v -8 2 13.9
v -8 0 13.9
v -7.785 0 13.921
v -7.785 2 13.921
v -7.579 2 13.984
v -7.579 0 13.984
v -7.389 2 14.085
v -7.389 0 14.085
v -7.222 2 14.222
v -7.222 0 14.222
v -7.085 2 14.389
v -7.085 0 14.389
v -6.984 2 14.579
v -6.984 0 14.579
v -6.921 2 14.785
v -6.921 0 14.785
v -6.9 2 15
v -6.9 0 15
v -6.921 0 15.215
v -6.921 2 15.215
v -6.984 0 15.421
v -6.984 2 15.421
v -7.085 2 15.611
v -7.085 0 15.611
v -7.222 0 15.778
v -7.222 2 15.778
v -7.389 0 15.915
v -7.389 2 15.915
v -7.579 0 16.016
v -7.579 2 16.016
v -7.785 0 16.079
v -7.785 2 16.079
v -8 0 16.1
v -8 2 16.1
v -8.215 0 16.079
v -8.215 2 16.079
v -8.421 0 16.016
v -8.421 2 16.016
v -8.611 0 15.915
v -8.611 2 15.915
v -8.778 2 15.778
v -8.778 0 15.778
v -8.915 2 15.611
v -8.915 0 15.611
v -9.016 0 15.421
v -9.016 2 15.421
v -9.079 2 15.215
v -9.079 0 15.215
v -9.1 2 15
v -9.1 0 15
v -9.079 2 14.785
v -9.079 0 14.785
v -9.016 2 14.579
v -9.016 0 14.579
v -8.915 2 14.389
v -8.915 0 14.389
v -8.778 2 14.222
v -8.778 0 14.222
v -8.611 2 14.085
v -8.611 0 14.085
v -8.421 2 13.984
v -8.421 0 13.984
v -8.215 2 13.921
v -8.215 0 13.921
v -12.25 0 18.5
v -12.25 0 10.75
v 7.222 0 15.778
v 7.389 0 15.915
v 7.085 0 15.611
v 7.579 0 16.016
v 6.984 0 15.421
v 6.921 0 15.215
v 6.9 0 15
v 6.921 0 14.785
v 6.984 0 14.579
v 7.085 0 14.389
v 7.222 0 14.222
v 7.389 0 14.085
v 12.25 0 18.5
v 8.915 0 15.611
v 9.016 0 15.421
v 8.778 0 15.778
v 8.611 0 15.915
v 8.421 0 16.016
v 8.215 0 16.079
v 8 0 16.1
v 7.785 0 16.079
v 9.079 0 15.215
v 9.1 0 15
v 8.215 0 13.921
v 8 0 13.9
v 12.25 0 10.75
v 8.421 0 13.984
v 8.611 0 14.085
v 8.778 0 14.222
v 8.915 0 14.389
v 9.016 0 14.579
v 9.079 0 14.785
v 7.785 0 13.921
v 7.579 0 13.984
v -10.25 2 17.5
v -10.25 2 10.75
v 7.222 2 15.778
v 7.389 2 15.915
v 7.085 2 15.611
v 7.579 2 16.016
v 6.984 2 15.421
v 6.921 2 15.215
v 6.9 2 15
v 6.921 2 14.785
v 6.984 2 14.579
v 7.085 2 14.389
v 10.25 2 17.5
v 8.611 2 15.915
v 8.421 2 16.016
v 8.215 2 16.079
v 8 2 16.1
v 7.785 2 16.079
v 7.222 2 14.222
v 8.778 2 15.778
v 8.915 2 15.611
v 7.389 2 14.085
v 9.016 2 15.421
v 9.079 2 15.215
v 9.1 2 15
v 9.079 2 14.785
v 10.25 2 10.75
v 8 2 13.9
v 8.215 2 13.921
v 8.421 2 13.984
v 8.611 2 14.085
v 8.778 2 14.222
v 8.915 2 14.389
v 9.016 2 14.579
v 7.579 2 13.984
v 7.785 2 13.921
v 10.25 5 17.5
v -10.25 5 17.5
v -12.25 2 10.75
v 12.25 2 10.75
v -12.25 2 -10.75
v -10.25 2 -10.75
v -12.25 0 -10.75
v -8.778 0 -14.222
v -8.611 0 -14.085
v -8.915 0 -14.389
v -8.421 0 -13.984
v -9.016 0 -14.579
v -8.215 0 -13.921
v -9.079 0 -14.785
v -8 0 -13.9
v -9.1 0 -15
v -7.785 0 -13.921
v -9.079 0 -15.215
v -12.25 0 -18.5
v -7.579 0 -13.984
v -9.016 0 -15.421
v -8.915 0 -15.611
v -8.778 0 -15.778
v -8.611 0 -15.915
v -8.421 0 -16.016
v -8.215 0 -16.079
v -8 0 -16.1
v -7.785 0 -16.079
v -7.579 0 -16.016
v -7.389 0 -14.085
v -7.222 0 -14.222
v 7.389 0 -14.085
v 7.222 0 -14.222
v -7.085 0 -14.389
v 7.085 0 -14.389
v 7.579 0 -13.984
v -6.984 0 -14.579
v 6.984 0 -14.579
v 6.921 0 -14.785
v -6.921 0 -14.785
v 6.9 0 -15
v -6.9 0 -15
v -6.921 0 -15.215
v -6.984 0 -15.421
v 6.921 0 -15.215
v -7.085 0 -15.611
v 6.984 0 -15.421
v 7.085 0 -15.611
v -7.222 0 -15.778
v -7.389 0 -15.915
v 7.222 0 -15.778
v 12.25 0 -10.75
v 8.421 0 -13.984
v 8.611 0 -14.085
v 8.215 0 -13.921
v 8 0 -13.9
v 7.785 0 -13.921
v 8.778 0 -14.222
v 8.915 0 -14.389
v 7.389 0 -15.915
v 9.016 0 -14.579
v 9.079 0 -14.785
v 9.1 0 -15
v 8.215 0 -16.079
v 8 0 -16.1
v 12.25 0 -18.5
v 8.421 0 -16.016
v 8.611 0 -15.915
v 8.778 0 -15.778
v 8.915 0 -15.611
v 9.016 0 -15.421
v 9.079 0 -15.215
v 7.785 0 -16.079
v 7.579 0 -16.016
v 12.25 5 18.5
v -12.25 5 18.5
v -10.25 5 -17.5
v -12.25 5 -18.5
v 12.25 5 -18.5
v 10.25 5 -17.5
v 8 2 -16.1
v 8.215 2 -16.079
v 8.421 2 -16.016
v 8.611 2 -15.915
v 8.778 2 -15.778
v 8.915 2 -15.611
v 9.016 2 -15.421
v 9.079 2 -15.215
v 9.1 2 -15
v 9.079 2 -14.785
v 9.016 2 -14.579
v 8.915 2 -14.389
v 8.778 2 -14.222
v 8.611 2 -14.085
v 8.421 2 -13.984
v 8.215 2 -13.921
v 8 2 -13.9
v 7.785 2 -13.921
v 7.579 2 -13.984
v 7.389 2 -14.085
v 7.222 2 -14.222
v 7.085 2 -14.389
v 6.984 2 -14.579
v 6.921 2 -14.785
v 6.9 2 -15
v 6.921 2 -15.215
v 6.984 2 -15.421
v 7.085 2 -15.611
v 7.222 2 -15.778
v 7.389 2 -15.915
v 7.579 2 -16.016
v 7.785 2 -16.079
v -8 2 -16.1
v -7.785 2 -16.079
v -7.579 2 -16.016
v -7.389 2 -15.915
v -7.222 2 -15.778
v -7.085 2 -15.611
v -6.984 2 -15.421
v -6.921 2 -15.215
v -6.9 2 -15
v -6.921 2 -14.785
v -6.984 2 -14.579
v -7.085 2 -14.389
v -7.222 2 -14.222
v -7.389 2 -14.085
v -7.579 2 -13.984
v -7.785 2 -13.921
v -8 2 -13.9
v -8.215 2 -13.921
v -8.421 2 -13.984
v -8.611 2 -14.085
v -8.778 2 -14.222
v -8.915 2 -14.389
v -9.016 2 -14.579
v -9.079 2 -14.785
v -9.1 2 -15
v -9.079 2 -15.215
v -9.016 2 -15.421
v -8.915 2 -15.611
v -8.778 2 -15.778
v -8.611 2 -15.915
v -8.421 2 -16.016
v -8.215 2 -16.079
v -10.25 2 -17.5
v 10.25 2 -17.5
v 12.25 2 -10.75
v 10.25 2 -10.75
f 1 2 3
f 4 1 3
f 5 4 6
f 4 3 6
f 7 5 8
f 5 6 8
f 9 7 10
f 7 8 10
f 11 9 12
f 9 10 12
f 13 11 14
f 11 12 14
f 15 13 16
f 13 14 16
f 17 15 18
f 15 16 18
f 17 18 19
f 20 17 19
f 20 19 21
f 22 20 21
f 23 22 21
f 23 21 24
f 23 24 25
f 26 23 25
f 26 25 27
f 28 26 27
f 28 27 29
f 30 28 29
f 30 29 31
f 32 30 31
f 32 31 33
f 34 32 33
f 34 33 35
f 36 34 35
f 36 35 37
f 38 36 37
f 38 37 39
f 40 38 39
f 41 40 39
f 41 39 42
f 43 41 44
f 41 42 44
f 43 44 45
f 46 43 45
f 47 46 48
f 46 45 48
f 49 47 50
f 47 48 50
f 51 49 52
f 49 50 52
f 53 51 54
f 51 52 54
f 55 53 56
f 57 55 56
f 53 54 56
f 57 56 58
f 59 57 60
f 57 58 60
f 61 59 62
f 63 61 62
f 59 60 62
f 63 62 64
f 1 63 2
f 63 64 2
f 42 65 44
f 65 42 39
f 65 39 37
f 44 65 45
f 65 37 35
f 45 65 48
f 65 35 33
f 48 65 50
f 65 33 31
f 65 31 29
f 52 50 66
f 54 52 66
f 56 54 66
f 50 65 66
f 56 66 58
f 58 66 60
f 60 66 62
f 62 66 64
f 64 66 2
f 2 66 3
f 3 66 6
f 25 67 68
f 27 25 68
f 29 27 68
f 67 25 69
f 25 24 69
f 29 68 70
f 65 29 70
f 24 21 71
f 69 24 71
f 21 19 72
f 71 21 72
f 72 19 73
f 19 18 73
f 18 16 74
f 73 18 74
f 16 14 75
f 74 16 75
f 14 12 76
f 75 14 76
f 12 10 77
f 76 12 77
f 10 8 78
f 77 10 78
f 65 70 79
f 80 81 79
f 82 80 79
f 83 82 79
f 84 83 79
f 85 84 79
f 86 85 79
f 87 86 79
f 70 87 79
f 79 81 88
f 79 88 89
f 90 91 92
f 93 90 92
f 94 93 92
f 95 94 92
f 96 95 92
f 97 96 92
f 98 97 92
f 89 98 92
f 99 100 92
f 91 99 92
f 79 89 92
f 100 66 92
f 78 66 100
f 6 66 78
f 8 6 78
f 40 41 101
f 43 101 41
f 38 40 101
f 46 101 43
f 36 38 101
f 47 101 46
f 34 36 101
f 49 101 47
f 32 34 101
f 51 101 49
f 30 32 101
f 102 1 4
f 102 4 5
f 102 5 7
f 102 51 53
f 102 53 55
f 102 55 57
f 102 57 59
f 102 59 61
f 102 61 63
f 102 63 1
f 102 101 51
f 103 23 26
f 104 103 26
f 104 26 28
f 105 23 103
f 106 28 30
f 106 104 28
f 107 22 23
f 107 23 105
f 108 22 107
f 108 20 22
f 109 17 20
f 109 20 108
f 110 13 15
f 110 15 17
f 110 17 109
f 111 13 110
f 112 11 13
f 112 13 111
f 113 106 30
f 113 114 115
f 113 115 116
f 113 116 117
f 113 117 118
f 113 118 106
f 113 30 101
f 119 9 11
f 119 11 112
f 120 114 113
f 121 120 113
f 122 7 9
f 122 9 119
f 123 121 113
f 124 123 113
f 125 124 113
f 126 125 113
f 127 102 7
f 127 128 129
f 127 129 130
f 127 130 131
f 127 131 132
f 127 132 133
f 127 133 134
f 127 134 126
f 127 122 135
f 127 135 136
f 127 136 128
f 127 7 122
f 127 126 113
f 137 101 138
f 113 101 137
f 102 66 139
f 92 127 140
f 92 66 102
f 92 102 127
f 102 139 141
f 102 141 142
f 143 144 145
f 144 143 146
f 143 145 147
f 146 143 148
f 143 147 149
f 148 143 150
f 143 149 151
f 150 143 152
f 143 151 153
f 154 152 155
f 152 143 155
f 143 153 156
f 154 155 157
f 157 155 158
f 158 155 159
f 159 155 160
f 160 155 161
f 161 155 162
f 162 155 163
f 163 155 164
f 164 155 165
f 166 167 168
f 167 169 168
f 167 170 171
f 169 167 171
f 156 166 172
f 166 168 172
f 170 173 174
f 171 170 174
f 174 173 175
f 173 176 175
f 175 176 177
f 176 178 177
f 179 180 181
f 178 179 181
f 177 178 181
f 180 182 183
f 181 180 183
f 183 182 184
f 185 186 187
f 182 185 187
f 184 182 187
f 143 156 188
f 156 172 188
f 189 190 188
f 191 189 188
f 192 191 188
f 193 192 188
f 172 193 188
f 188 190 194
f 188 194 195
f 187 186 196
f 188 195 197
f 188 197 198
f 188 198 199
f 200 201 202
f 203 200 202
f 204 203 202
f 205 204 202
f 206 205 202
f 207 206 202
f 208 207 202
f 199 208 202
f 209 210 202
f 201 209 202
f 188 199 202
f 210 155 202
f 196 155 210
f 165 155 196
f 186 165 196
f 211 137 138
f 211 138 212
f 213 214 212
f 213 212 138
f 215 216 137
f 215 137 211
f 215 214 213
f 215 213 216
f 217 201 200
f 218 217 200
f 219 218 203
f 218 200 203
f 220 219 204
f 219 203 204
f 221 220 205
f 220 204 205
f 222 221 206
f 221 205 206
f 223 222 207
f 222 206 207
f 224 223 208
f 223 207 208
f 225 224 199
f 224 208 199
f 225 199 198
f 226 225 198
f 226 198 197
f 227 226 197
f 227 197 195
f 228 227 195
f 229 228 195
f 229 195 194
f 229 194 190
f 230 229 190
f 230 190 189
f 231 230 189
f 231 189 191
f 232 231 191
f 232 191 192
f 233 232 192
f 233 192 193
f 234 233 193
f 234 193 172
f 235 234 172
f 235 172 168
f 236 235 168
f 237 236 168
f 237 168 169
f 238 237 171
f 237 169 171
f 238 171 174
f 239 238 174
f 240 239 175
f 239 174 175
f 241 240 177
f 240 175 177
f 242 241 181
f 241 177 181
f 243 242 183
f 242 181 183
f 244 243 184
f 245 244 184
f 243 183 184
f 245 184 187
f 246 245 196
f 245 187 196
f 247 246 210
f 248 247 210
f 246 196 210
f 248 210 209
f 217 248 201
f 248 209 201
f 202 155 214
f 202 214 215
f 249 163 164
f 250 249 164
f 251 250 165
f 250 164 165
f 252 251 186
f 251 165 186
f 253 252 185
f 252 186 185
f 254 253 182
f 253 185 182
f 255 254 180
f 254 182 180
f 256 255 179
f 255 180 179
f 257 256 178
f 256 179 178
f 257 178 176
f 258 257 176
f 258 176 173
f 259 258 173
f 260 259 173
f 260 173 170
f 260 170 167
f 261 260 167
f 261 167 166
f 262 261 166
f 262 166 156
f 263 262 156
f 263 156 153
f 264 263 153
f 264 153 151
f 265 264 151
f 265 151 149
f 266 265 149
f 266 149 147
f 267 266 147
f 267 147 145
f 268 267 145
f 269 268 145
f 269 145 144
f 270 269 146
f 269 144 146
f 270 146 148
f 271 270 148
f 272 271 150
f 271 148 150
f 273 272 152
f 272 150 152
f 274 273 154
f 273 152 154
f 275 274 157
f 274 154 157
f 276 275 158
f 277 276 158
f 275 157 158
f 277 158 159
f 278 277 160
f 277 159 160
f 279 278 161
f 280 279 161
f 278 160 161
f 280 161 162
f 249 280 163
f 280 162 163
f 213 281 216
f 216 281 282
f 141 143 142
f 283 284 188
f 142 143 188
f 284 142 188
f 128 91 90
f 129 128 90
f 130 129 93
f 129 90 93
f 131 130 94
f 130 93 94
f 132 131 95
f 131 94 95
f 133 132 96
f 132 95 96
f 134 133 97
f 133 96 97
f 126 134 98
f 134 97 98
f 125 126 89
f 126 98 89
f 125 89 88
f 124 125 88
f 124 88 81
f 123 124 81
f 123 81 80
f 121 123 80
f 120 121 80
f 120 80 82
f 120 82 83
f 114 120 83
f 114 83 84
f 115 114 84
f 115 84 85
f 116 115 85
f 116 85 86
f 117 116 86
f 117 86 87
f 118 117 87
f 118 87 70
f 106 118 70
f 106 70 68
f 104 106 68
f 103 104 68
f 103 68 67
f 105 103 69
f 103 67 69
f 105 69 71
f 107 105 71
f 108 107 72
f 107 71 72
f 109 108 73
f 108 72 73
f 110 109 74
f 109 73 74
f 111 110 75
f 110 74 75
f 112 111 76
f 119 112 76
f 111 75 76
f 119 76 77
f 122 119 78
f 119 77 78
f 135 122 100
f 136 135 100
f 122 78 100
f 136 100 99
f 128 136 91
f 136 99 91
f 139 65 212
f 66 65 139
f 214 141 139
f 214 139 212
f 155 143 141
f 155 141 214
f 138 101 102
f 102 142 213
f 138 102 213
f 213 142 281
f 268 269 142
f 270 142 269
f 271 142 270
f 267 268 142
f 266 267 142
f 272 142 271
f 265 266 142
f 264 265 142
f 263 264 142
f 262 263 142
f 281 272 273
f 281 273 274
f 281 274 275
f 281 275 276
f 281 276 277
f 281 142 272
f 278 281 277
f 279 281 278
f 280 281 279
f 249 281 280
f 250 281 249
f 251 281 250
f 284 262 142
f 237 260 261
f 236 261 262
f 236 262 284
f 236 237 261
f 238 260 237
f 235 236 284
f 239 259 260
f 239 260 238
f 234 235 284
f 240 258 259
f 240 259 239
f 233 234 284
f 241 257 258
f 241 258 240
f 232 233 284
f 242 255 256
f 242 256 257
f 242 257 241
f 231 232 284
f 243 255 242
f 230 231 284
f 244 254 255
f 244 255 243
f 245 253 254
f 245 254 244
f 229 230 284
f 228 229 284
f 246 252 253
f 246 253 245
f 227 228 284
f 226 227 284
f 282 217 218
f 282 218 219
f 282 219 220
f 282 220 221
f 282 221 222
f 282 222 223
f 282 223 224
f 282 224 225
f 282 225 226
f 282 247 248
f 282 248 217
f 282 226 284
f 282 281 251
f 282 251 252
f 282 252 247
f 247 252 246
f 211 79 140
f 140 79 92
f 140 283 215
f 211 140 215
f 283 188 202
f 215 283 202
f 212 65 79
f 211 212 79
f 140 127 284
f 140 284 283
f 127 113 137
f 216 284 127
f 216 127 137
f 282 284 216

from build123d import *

# Parameters (mm, degrees)
SKETCH_1_W          = 20.5
SKETCH_1_H          = 35
EXTRUDE_1_DEPTH     = 2
SKETCH_2_W          = 24.5
SKETCH_2_H          = 37
SKETCH_2_W_2        = 20.5
SKETCH_2_H_2        = 35
EXTRUDE_2_DEPTH     = 5
SKETCH_3_R          = 1.1
CUT_EXTRUDE_1_DEPTH = 23.744504831
SKETCH_4_W          = 24.5
SKETCH_4_H          = 21.5
CUT_EXTRUDE_4_DEPTH = 2


with BuildPart() as part:
    # 草图1 → 凸台-拉伸1 (new body)
    with BuildSketch(Plane(origin=(0, 0, 0), x_dir=(1, 0, 0), z_dir=(0, 1, 0))):
        Rectangle(SKETCH_1_W, SKETCH_1_H)
    extrude(amount=EXTRUDE_1_DEPTH)

    # 草图2 → 凸台-拉伸2 (add)
    with BuildSketch(Plane(origin=(0, 0, 0), x_dir=(1, 0, 0), z_dir=(0, 1, 0))):
        Rectangle(SKETCH_2_W, SKETCH_2_H)
        Rectangle(SKETCH_2_W_2, SKETCH_2_H_2, mode=Mode.SUBTRACT)
    extrude(amount=EXTRUDE_2_DEPTH)

    # 草图3 → 切除-拉伸1 (cut, through all)
    with BuildSketch(Plane.XZ):
        with Locations(Location((-8, 15, 0), (0, 0, 270))):
            Circle(SKETCH_3_R)
        with Locations(Location((8, 15, 0), (0, 0, 270))):
            Circle(SKETCH_3_R)
        with Locations(Location((8, -15, 0), (0, 0, 270))):
            Circle(SKETCH_3_R)
        with Locations(Location((-8, -15, 0), (0, 0, 270))):
            Circle(SKETCH_3_R)
    extrude(amount=-CUT_EXTRUDE_1_DEPTH, mode=Mode.SUBTRACT)

    # 草图4 → 切除-拉伸4 (cut)
    with BuildSketch(Plane.XZ):
        Rectangle(SKETCH_4_W, SKETCH_4_H)
    extrude(amount=-CUT_EXTRUDE_4_DEPTH, mode=Mode.SUBTRACT)


solid = part.part
